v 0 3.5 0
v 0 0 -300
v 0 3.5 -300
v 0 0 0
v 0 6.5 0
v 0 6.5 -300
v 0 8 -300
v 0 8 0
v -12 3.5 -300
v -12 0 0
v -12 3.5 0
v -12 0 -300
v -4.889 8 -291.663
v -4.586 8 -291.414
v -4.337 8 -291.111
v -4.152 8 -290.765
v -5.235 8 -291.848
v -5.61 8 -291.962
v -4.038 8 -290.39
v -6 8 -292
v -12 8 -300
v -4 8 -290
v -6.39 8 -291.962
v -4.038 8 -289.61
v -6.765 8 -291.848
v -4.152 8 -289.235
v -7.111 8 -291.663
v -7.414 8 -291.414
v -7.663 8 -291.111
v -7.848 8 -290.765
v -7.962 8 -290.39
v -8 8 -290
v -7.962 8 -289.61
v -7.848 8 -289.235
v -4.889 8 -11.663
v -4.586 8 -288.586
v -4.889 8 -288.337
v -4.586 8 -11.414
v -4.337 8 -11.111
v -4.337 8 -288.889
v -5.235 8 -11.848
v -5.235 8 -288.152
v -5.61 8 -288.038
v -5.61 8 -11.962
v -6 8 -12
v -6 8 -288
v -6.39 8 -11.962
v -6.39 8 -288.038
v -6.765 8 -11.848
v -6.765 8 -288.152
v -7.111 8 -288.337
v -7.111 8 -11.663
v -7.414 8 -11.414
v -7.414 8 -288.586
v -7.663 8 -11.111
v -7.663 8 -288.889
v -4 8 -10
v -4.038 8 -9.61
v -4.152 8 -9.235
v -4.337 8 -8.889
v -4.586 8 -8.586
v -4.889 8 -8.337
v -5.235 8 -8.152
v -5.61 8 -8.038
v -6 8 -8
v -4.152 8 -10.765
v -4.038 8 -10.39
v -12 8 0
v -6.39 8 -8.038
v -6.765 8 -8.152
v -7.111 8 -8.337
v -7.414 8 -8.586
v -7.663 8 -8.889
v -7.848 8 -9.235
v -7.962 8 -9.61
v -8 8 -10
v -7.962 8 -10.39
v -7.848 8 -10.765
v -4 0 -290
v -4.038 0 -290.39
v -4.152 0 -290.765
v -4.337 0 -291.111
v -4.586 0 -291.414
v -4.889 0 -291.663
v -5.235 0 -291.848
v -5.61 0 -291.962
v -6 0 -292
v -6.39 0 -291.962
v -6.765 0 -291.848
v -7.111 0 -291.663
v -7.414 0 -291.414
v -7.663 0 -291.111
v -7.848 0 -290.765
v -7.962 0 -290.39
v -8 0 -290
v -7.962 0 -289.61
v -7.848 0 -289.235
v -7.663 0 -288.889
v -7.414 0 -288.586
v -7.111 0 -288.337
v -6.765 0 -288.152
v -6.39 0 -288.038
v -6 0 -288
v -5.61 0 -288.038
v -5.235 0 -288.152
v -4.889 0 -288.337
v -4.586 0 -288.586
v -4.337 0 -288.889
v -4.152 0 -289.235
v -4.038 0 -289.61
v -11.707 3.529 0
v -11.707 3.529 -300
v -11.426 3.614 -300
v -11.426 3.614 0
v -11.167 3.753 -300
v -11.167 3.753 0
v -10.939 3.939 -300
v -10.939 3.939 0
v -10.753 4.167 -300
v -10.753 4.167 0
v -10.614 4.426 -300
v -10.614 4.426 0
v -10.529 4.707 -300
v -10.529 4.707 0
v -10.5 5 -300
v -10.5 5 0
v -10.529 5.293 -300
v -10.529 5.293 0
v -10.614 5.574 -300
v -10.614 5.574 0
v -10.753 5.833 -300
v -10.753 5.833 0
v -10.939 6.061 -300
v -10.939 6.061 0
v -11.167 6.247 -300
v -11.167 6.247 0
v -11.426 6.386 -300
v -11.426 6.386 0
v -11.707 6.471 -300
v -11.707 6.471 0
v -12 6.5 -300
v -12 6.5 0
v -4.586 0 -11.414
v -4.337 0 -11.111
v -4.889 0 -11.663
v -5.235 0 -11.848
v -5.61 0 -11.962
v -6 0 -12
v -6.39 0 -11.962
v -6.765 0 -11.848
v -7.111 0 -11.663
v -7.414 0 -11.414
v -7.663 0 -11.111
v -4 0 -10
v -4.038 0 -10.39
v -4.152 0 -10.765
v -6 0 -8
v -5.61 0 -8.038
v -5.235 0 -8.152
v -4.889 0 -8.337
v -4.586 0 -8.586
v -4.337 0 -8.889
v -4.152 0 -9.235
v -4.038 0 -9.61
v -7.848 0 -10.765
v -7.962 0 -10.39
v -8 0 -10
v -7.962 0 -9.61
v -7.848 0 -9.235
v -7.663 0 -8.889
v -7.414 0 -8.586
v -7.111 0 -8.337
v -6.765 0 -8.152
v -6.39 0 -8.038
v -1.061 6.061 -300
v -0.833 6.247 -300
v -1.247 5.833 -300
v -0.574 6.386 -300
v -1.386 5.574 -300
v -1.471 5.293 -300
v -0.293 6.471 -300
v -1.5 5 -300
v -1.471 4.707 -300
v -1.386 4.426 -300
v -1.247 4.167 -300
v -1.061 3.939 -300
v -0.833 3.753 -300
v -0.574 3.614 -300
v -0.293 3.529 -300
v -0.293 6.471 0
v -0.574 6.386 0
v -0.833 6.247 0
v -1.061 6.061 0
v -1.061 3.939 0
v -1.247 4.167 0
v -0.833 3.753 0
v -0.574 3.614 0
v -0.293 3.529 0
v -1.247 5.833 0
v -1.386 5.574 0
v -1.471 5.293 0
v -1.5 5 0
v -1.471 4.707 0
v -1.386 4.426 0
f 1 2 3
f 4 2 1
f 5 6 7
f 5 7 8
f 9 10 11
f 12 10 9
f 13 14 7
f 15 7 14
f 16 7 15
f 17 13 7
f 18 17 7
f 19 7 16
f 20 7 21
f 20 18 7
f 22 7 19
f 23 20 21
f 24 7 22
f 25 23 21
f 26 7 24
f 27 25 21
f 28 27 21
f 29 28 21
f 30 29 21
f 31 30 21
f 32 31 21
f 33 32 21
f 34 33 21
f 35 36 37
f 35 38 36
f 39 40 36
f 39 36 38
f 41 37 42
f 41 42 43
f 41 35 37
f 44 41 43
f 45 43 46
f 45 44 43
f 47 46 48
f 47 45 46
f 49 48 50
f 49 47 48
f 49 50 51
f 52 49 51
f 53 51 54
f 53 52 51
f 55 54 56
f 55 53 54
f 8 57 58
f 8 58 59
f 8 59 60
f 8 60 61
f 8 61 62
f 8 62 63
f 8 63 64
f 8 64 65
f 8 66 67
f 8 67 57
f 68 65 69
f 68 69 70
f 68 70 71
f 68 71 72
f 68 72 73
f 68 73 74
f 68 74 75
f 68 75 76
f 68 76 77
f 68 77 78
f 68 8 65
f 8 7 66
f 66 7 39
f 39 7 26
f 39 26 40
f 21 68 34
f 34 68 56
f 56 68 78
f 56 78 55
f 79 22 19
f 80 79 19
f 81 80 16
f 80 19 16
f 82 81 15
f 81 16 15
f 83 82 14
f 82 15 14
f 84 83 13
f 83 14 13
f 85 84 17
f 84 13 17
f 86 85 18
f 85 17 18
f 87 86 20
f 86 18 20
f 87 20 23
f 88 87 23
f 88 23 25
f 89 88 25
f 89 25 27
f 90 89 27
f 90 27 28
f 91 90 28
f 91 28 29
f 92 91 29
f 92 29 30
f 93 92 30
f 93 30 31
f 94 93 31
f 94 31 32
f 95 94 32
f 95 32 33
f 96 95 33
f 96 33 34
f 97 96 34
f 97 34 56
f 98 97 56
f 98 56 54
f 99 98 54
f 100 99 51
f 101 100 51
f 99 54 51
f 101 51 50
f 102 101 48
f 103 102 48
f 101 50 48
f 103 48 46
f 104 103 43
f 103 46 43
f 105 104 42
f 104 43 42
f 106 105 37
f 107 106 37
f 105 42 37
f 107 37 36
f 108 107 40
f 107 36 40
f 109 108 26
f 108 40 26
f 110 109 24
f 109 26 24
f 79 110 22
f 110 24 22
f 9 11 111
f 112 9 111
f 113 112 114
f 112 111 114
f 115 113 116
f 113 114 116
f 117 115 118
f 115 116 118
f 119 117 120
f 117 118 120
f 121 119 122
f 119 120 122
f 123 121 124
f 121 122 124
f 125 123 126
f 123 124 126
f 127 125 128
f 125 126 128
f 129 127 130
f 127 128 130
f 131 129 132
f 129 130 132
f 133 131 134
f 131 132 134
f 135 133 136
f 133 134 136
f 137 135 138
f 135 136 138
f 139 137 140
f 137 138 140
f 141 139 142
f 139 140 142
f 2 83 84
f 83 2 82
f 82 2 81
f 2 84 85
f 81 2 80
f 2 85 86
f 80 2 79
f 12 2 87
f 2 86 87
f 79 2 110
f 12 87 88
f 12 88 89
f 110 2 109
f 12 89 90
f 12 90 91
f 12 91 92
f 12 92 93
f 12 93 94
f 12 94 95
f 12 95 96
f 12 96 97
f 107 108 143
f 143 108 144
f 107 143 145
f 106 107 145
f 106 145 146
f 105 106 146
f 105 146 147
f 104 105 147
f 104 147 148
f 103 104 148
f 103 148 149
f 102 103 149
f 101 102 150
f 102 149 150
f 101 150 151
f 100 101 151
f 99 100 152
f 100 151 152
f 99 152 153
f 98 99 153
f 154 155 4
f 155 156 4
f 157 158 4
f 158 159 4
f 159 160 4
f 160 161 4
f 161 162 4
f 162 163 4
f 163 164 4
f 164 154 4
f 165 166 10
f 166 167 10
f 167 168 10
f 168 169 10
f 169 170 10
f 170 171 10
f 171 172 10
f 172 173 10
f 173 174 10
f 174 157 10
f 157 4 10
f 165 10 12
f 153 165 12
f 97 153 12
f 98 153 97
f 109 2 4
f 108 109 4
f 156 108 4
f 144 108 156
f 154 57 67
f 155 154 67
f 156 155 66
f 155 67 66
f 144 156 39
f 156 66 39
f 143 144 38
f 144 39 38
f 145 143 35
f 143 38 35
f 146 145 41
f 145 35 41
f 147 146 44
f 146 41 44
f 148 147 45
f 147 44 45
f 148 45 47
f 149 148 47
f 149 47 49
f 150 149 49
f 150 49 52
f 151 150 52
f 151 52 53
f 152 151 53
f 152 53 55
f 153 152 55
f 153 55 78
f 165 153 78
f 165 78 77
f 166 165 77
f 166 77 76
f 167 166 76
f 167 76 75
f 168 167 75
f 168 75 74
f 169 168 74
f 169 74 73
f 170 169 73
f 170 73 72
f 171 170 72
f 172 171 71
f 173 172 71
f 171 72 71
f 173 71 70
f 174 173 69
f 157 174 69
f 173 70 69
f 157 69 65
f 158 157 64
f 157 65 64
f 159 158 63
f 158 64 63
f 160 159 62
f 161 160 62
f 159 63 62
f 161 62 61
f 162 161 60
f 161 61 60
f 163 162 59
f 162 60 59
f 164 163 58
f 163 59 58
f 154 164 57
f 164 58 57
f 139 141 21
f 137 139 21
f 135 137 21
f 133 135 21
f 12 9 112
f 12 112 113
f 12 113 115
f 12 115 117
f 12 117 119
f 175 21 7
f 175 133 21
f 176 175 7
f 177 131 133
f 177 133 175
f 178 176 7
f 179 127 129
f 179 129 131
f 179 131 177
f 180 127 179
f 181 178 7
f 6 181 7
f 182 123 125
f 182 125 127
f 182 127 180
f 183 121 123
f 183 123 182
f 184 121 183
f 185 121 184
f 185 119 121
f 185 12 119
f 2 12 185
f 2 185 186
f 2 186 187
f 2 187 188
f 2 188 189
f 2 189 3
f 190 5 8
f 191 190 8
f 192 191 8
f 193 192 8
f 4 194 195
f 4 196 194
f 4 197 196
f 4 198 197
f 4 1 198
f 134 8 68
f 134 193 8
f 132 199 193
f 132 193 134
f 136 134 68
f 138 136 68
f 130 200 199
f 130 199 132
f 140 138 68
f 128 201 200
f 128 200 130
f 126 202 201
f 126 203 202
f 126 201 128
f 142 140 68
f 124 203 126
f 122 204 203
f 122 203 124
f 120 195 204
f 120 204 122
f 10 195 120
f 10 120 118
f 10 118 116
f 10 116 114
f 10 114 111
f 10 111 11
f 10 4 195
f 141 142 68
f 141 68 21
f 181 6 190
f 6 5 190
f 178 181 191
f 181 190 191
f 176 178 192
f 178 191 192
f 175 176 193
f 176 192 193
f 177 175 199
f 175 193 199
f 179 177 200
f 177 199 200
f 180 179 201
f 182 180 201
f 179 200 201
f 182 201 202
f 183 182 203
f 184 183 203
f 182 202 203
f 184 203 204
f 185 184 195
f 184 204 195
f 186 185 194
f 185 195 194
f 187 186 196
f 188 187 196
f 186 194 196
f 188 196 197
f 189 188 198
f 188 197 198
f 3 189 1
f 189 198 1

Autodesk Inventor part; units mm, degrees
ref_plane "YZ Plane" through (0, 0, 0) normal (1, 0, 0) x (0, 1, 0)
ref_plane "XZ Plane" through (0, 0, 0) normal (0, 1, 0) x (-1, 0, 0)
ref_plane "XY Plane" through (0, 0, 0) normal (0, 0, 1) x (1, 0, 0)
sketch "草图1" plane through (0, 0, 0) normal (0, 1, 0) x (-1, 0, 0)
  line L0 (0, 0) -> (12, 0)
  line L1 (12, 0) -> (12, -300)
  line L2 (12, -300) -> (0, -300)
  line L3 (0, -300) -> (0, 0)
  dimension "d0" = 12
  dimension "d1" = 300
extrude "拉伸1" add sketch "草图1" along normal blind 8
sketch "草图2" plane through (-12, 0, 0) normal (0, 0, 1) x (1, 0, 0)
  line L0 (0, 8) -> (0, 5)
  line L1 (0, 0) -> (0, 8) projected
  circle A0 centre (0, 5) radius 1.5
  line L2 (12, 8) -> (0, 8) projected
  line L3 (6, 8) -> (6, -1.6041)
  line L4 (12, 8) -> (12, 5)
  line L5 (12, 0) -> (12, 8)
  circle A1 centre (12, 5) radius 1.5
  line L6 (0, 8) -> (12, 8)
  point P0 (12, 6.5)
  point P1 (12, 3.5)
  point P2 (0, 6.5)
  point P3 (0, 3.5)
  dimension "d9" = 3
  dimension "d10" = 3
extrude "拉伸2" cut sketch "草图2" against normal through all contours A0 L1 L0 | L4 L5 A1 picked at (0.7027, 4.2973) picked at (11.121, 5.4613)
sketch "草图3" plane through (0, 8, 0) normal (0, 1, 0) x (1, 0, 0)
  line L0 (-12, 0) -> (0, 0) projected
  line L1 (-6, 0) -> (-6, 10)
  circle A0 centre (-6, 10) radius 2
  line L2 (0, 300) -> (-12, 300) projected
  line L3 (-6, 300) -> (-6, 290)
  circle A1 centre (-6, 290) radius 2
  dimension "d11" = 10
  dimension "d12" = 4
  dimension "d13" = 10
  dimension "d14" = 4
extrude "拉伸3" cut sketch "草图3" against normal through all
equation "\"折弯半径\" = 厚度"
equation "\"折弯释压宽度\" = 厚度"
equation "\"折弯释压深度\" = 0.5 * 厚度"
equation "\"拐角释压尺寸\" = 4 * 厚度"
equation "\"最小余量\" = 2 * 厚度"
equation "\"过渡半径\" = 折弯半径"
equation "\"Jacobi半径尺寸\" = 折弯半径"
equation "\"间隙大小\" = 厚度"
equation "\"厚度\" = 0.5"
properties part number "滑轨"
